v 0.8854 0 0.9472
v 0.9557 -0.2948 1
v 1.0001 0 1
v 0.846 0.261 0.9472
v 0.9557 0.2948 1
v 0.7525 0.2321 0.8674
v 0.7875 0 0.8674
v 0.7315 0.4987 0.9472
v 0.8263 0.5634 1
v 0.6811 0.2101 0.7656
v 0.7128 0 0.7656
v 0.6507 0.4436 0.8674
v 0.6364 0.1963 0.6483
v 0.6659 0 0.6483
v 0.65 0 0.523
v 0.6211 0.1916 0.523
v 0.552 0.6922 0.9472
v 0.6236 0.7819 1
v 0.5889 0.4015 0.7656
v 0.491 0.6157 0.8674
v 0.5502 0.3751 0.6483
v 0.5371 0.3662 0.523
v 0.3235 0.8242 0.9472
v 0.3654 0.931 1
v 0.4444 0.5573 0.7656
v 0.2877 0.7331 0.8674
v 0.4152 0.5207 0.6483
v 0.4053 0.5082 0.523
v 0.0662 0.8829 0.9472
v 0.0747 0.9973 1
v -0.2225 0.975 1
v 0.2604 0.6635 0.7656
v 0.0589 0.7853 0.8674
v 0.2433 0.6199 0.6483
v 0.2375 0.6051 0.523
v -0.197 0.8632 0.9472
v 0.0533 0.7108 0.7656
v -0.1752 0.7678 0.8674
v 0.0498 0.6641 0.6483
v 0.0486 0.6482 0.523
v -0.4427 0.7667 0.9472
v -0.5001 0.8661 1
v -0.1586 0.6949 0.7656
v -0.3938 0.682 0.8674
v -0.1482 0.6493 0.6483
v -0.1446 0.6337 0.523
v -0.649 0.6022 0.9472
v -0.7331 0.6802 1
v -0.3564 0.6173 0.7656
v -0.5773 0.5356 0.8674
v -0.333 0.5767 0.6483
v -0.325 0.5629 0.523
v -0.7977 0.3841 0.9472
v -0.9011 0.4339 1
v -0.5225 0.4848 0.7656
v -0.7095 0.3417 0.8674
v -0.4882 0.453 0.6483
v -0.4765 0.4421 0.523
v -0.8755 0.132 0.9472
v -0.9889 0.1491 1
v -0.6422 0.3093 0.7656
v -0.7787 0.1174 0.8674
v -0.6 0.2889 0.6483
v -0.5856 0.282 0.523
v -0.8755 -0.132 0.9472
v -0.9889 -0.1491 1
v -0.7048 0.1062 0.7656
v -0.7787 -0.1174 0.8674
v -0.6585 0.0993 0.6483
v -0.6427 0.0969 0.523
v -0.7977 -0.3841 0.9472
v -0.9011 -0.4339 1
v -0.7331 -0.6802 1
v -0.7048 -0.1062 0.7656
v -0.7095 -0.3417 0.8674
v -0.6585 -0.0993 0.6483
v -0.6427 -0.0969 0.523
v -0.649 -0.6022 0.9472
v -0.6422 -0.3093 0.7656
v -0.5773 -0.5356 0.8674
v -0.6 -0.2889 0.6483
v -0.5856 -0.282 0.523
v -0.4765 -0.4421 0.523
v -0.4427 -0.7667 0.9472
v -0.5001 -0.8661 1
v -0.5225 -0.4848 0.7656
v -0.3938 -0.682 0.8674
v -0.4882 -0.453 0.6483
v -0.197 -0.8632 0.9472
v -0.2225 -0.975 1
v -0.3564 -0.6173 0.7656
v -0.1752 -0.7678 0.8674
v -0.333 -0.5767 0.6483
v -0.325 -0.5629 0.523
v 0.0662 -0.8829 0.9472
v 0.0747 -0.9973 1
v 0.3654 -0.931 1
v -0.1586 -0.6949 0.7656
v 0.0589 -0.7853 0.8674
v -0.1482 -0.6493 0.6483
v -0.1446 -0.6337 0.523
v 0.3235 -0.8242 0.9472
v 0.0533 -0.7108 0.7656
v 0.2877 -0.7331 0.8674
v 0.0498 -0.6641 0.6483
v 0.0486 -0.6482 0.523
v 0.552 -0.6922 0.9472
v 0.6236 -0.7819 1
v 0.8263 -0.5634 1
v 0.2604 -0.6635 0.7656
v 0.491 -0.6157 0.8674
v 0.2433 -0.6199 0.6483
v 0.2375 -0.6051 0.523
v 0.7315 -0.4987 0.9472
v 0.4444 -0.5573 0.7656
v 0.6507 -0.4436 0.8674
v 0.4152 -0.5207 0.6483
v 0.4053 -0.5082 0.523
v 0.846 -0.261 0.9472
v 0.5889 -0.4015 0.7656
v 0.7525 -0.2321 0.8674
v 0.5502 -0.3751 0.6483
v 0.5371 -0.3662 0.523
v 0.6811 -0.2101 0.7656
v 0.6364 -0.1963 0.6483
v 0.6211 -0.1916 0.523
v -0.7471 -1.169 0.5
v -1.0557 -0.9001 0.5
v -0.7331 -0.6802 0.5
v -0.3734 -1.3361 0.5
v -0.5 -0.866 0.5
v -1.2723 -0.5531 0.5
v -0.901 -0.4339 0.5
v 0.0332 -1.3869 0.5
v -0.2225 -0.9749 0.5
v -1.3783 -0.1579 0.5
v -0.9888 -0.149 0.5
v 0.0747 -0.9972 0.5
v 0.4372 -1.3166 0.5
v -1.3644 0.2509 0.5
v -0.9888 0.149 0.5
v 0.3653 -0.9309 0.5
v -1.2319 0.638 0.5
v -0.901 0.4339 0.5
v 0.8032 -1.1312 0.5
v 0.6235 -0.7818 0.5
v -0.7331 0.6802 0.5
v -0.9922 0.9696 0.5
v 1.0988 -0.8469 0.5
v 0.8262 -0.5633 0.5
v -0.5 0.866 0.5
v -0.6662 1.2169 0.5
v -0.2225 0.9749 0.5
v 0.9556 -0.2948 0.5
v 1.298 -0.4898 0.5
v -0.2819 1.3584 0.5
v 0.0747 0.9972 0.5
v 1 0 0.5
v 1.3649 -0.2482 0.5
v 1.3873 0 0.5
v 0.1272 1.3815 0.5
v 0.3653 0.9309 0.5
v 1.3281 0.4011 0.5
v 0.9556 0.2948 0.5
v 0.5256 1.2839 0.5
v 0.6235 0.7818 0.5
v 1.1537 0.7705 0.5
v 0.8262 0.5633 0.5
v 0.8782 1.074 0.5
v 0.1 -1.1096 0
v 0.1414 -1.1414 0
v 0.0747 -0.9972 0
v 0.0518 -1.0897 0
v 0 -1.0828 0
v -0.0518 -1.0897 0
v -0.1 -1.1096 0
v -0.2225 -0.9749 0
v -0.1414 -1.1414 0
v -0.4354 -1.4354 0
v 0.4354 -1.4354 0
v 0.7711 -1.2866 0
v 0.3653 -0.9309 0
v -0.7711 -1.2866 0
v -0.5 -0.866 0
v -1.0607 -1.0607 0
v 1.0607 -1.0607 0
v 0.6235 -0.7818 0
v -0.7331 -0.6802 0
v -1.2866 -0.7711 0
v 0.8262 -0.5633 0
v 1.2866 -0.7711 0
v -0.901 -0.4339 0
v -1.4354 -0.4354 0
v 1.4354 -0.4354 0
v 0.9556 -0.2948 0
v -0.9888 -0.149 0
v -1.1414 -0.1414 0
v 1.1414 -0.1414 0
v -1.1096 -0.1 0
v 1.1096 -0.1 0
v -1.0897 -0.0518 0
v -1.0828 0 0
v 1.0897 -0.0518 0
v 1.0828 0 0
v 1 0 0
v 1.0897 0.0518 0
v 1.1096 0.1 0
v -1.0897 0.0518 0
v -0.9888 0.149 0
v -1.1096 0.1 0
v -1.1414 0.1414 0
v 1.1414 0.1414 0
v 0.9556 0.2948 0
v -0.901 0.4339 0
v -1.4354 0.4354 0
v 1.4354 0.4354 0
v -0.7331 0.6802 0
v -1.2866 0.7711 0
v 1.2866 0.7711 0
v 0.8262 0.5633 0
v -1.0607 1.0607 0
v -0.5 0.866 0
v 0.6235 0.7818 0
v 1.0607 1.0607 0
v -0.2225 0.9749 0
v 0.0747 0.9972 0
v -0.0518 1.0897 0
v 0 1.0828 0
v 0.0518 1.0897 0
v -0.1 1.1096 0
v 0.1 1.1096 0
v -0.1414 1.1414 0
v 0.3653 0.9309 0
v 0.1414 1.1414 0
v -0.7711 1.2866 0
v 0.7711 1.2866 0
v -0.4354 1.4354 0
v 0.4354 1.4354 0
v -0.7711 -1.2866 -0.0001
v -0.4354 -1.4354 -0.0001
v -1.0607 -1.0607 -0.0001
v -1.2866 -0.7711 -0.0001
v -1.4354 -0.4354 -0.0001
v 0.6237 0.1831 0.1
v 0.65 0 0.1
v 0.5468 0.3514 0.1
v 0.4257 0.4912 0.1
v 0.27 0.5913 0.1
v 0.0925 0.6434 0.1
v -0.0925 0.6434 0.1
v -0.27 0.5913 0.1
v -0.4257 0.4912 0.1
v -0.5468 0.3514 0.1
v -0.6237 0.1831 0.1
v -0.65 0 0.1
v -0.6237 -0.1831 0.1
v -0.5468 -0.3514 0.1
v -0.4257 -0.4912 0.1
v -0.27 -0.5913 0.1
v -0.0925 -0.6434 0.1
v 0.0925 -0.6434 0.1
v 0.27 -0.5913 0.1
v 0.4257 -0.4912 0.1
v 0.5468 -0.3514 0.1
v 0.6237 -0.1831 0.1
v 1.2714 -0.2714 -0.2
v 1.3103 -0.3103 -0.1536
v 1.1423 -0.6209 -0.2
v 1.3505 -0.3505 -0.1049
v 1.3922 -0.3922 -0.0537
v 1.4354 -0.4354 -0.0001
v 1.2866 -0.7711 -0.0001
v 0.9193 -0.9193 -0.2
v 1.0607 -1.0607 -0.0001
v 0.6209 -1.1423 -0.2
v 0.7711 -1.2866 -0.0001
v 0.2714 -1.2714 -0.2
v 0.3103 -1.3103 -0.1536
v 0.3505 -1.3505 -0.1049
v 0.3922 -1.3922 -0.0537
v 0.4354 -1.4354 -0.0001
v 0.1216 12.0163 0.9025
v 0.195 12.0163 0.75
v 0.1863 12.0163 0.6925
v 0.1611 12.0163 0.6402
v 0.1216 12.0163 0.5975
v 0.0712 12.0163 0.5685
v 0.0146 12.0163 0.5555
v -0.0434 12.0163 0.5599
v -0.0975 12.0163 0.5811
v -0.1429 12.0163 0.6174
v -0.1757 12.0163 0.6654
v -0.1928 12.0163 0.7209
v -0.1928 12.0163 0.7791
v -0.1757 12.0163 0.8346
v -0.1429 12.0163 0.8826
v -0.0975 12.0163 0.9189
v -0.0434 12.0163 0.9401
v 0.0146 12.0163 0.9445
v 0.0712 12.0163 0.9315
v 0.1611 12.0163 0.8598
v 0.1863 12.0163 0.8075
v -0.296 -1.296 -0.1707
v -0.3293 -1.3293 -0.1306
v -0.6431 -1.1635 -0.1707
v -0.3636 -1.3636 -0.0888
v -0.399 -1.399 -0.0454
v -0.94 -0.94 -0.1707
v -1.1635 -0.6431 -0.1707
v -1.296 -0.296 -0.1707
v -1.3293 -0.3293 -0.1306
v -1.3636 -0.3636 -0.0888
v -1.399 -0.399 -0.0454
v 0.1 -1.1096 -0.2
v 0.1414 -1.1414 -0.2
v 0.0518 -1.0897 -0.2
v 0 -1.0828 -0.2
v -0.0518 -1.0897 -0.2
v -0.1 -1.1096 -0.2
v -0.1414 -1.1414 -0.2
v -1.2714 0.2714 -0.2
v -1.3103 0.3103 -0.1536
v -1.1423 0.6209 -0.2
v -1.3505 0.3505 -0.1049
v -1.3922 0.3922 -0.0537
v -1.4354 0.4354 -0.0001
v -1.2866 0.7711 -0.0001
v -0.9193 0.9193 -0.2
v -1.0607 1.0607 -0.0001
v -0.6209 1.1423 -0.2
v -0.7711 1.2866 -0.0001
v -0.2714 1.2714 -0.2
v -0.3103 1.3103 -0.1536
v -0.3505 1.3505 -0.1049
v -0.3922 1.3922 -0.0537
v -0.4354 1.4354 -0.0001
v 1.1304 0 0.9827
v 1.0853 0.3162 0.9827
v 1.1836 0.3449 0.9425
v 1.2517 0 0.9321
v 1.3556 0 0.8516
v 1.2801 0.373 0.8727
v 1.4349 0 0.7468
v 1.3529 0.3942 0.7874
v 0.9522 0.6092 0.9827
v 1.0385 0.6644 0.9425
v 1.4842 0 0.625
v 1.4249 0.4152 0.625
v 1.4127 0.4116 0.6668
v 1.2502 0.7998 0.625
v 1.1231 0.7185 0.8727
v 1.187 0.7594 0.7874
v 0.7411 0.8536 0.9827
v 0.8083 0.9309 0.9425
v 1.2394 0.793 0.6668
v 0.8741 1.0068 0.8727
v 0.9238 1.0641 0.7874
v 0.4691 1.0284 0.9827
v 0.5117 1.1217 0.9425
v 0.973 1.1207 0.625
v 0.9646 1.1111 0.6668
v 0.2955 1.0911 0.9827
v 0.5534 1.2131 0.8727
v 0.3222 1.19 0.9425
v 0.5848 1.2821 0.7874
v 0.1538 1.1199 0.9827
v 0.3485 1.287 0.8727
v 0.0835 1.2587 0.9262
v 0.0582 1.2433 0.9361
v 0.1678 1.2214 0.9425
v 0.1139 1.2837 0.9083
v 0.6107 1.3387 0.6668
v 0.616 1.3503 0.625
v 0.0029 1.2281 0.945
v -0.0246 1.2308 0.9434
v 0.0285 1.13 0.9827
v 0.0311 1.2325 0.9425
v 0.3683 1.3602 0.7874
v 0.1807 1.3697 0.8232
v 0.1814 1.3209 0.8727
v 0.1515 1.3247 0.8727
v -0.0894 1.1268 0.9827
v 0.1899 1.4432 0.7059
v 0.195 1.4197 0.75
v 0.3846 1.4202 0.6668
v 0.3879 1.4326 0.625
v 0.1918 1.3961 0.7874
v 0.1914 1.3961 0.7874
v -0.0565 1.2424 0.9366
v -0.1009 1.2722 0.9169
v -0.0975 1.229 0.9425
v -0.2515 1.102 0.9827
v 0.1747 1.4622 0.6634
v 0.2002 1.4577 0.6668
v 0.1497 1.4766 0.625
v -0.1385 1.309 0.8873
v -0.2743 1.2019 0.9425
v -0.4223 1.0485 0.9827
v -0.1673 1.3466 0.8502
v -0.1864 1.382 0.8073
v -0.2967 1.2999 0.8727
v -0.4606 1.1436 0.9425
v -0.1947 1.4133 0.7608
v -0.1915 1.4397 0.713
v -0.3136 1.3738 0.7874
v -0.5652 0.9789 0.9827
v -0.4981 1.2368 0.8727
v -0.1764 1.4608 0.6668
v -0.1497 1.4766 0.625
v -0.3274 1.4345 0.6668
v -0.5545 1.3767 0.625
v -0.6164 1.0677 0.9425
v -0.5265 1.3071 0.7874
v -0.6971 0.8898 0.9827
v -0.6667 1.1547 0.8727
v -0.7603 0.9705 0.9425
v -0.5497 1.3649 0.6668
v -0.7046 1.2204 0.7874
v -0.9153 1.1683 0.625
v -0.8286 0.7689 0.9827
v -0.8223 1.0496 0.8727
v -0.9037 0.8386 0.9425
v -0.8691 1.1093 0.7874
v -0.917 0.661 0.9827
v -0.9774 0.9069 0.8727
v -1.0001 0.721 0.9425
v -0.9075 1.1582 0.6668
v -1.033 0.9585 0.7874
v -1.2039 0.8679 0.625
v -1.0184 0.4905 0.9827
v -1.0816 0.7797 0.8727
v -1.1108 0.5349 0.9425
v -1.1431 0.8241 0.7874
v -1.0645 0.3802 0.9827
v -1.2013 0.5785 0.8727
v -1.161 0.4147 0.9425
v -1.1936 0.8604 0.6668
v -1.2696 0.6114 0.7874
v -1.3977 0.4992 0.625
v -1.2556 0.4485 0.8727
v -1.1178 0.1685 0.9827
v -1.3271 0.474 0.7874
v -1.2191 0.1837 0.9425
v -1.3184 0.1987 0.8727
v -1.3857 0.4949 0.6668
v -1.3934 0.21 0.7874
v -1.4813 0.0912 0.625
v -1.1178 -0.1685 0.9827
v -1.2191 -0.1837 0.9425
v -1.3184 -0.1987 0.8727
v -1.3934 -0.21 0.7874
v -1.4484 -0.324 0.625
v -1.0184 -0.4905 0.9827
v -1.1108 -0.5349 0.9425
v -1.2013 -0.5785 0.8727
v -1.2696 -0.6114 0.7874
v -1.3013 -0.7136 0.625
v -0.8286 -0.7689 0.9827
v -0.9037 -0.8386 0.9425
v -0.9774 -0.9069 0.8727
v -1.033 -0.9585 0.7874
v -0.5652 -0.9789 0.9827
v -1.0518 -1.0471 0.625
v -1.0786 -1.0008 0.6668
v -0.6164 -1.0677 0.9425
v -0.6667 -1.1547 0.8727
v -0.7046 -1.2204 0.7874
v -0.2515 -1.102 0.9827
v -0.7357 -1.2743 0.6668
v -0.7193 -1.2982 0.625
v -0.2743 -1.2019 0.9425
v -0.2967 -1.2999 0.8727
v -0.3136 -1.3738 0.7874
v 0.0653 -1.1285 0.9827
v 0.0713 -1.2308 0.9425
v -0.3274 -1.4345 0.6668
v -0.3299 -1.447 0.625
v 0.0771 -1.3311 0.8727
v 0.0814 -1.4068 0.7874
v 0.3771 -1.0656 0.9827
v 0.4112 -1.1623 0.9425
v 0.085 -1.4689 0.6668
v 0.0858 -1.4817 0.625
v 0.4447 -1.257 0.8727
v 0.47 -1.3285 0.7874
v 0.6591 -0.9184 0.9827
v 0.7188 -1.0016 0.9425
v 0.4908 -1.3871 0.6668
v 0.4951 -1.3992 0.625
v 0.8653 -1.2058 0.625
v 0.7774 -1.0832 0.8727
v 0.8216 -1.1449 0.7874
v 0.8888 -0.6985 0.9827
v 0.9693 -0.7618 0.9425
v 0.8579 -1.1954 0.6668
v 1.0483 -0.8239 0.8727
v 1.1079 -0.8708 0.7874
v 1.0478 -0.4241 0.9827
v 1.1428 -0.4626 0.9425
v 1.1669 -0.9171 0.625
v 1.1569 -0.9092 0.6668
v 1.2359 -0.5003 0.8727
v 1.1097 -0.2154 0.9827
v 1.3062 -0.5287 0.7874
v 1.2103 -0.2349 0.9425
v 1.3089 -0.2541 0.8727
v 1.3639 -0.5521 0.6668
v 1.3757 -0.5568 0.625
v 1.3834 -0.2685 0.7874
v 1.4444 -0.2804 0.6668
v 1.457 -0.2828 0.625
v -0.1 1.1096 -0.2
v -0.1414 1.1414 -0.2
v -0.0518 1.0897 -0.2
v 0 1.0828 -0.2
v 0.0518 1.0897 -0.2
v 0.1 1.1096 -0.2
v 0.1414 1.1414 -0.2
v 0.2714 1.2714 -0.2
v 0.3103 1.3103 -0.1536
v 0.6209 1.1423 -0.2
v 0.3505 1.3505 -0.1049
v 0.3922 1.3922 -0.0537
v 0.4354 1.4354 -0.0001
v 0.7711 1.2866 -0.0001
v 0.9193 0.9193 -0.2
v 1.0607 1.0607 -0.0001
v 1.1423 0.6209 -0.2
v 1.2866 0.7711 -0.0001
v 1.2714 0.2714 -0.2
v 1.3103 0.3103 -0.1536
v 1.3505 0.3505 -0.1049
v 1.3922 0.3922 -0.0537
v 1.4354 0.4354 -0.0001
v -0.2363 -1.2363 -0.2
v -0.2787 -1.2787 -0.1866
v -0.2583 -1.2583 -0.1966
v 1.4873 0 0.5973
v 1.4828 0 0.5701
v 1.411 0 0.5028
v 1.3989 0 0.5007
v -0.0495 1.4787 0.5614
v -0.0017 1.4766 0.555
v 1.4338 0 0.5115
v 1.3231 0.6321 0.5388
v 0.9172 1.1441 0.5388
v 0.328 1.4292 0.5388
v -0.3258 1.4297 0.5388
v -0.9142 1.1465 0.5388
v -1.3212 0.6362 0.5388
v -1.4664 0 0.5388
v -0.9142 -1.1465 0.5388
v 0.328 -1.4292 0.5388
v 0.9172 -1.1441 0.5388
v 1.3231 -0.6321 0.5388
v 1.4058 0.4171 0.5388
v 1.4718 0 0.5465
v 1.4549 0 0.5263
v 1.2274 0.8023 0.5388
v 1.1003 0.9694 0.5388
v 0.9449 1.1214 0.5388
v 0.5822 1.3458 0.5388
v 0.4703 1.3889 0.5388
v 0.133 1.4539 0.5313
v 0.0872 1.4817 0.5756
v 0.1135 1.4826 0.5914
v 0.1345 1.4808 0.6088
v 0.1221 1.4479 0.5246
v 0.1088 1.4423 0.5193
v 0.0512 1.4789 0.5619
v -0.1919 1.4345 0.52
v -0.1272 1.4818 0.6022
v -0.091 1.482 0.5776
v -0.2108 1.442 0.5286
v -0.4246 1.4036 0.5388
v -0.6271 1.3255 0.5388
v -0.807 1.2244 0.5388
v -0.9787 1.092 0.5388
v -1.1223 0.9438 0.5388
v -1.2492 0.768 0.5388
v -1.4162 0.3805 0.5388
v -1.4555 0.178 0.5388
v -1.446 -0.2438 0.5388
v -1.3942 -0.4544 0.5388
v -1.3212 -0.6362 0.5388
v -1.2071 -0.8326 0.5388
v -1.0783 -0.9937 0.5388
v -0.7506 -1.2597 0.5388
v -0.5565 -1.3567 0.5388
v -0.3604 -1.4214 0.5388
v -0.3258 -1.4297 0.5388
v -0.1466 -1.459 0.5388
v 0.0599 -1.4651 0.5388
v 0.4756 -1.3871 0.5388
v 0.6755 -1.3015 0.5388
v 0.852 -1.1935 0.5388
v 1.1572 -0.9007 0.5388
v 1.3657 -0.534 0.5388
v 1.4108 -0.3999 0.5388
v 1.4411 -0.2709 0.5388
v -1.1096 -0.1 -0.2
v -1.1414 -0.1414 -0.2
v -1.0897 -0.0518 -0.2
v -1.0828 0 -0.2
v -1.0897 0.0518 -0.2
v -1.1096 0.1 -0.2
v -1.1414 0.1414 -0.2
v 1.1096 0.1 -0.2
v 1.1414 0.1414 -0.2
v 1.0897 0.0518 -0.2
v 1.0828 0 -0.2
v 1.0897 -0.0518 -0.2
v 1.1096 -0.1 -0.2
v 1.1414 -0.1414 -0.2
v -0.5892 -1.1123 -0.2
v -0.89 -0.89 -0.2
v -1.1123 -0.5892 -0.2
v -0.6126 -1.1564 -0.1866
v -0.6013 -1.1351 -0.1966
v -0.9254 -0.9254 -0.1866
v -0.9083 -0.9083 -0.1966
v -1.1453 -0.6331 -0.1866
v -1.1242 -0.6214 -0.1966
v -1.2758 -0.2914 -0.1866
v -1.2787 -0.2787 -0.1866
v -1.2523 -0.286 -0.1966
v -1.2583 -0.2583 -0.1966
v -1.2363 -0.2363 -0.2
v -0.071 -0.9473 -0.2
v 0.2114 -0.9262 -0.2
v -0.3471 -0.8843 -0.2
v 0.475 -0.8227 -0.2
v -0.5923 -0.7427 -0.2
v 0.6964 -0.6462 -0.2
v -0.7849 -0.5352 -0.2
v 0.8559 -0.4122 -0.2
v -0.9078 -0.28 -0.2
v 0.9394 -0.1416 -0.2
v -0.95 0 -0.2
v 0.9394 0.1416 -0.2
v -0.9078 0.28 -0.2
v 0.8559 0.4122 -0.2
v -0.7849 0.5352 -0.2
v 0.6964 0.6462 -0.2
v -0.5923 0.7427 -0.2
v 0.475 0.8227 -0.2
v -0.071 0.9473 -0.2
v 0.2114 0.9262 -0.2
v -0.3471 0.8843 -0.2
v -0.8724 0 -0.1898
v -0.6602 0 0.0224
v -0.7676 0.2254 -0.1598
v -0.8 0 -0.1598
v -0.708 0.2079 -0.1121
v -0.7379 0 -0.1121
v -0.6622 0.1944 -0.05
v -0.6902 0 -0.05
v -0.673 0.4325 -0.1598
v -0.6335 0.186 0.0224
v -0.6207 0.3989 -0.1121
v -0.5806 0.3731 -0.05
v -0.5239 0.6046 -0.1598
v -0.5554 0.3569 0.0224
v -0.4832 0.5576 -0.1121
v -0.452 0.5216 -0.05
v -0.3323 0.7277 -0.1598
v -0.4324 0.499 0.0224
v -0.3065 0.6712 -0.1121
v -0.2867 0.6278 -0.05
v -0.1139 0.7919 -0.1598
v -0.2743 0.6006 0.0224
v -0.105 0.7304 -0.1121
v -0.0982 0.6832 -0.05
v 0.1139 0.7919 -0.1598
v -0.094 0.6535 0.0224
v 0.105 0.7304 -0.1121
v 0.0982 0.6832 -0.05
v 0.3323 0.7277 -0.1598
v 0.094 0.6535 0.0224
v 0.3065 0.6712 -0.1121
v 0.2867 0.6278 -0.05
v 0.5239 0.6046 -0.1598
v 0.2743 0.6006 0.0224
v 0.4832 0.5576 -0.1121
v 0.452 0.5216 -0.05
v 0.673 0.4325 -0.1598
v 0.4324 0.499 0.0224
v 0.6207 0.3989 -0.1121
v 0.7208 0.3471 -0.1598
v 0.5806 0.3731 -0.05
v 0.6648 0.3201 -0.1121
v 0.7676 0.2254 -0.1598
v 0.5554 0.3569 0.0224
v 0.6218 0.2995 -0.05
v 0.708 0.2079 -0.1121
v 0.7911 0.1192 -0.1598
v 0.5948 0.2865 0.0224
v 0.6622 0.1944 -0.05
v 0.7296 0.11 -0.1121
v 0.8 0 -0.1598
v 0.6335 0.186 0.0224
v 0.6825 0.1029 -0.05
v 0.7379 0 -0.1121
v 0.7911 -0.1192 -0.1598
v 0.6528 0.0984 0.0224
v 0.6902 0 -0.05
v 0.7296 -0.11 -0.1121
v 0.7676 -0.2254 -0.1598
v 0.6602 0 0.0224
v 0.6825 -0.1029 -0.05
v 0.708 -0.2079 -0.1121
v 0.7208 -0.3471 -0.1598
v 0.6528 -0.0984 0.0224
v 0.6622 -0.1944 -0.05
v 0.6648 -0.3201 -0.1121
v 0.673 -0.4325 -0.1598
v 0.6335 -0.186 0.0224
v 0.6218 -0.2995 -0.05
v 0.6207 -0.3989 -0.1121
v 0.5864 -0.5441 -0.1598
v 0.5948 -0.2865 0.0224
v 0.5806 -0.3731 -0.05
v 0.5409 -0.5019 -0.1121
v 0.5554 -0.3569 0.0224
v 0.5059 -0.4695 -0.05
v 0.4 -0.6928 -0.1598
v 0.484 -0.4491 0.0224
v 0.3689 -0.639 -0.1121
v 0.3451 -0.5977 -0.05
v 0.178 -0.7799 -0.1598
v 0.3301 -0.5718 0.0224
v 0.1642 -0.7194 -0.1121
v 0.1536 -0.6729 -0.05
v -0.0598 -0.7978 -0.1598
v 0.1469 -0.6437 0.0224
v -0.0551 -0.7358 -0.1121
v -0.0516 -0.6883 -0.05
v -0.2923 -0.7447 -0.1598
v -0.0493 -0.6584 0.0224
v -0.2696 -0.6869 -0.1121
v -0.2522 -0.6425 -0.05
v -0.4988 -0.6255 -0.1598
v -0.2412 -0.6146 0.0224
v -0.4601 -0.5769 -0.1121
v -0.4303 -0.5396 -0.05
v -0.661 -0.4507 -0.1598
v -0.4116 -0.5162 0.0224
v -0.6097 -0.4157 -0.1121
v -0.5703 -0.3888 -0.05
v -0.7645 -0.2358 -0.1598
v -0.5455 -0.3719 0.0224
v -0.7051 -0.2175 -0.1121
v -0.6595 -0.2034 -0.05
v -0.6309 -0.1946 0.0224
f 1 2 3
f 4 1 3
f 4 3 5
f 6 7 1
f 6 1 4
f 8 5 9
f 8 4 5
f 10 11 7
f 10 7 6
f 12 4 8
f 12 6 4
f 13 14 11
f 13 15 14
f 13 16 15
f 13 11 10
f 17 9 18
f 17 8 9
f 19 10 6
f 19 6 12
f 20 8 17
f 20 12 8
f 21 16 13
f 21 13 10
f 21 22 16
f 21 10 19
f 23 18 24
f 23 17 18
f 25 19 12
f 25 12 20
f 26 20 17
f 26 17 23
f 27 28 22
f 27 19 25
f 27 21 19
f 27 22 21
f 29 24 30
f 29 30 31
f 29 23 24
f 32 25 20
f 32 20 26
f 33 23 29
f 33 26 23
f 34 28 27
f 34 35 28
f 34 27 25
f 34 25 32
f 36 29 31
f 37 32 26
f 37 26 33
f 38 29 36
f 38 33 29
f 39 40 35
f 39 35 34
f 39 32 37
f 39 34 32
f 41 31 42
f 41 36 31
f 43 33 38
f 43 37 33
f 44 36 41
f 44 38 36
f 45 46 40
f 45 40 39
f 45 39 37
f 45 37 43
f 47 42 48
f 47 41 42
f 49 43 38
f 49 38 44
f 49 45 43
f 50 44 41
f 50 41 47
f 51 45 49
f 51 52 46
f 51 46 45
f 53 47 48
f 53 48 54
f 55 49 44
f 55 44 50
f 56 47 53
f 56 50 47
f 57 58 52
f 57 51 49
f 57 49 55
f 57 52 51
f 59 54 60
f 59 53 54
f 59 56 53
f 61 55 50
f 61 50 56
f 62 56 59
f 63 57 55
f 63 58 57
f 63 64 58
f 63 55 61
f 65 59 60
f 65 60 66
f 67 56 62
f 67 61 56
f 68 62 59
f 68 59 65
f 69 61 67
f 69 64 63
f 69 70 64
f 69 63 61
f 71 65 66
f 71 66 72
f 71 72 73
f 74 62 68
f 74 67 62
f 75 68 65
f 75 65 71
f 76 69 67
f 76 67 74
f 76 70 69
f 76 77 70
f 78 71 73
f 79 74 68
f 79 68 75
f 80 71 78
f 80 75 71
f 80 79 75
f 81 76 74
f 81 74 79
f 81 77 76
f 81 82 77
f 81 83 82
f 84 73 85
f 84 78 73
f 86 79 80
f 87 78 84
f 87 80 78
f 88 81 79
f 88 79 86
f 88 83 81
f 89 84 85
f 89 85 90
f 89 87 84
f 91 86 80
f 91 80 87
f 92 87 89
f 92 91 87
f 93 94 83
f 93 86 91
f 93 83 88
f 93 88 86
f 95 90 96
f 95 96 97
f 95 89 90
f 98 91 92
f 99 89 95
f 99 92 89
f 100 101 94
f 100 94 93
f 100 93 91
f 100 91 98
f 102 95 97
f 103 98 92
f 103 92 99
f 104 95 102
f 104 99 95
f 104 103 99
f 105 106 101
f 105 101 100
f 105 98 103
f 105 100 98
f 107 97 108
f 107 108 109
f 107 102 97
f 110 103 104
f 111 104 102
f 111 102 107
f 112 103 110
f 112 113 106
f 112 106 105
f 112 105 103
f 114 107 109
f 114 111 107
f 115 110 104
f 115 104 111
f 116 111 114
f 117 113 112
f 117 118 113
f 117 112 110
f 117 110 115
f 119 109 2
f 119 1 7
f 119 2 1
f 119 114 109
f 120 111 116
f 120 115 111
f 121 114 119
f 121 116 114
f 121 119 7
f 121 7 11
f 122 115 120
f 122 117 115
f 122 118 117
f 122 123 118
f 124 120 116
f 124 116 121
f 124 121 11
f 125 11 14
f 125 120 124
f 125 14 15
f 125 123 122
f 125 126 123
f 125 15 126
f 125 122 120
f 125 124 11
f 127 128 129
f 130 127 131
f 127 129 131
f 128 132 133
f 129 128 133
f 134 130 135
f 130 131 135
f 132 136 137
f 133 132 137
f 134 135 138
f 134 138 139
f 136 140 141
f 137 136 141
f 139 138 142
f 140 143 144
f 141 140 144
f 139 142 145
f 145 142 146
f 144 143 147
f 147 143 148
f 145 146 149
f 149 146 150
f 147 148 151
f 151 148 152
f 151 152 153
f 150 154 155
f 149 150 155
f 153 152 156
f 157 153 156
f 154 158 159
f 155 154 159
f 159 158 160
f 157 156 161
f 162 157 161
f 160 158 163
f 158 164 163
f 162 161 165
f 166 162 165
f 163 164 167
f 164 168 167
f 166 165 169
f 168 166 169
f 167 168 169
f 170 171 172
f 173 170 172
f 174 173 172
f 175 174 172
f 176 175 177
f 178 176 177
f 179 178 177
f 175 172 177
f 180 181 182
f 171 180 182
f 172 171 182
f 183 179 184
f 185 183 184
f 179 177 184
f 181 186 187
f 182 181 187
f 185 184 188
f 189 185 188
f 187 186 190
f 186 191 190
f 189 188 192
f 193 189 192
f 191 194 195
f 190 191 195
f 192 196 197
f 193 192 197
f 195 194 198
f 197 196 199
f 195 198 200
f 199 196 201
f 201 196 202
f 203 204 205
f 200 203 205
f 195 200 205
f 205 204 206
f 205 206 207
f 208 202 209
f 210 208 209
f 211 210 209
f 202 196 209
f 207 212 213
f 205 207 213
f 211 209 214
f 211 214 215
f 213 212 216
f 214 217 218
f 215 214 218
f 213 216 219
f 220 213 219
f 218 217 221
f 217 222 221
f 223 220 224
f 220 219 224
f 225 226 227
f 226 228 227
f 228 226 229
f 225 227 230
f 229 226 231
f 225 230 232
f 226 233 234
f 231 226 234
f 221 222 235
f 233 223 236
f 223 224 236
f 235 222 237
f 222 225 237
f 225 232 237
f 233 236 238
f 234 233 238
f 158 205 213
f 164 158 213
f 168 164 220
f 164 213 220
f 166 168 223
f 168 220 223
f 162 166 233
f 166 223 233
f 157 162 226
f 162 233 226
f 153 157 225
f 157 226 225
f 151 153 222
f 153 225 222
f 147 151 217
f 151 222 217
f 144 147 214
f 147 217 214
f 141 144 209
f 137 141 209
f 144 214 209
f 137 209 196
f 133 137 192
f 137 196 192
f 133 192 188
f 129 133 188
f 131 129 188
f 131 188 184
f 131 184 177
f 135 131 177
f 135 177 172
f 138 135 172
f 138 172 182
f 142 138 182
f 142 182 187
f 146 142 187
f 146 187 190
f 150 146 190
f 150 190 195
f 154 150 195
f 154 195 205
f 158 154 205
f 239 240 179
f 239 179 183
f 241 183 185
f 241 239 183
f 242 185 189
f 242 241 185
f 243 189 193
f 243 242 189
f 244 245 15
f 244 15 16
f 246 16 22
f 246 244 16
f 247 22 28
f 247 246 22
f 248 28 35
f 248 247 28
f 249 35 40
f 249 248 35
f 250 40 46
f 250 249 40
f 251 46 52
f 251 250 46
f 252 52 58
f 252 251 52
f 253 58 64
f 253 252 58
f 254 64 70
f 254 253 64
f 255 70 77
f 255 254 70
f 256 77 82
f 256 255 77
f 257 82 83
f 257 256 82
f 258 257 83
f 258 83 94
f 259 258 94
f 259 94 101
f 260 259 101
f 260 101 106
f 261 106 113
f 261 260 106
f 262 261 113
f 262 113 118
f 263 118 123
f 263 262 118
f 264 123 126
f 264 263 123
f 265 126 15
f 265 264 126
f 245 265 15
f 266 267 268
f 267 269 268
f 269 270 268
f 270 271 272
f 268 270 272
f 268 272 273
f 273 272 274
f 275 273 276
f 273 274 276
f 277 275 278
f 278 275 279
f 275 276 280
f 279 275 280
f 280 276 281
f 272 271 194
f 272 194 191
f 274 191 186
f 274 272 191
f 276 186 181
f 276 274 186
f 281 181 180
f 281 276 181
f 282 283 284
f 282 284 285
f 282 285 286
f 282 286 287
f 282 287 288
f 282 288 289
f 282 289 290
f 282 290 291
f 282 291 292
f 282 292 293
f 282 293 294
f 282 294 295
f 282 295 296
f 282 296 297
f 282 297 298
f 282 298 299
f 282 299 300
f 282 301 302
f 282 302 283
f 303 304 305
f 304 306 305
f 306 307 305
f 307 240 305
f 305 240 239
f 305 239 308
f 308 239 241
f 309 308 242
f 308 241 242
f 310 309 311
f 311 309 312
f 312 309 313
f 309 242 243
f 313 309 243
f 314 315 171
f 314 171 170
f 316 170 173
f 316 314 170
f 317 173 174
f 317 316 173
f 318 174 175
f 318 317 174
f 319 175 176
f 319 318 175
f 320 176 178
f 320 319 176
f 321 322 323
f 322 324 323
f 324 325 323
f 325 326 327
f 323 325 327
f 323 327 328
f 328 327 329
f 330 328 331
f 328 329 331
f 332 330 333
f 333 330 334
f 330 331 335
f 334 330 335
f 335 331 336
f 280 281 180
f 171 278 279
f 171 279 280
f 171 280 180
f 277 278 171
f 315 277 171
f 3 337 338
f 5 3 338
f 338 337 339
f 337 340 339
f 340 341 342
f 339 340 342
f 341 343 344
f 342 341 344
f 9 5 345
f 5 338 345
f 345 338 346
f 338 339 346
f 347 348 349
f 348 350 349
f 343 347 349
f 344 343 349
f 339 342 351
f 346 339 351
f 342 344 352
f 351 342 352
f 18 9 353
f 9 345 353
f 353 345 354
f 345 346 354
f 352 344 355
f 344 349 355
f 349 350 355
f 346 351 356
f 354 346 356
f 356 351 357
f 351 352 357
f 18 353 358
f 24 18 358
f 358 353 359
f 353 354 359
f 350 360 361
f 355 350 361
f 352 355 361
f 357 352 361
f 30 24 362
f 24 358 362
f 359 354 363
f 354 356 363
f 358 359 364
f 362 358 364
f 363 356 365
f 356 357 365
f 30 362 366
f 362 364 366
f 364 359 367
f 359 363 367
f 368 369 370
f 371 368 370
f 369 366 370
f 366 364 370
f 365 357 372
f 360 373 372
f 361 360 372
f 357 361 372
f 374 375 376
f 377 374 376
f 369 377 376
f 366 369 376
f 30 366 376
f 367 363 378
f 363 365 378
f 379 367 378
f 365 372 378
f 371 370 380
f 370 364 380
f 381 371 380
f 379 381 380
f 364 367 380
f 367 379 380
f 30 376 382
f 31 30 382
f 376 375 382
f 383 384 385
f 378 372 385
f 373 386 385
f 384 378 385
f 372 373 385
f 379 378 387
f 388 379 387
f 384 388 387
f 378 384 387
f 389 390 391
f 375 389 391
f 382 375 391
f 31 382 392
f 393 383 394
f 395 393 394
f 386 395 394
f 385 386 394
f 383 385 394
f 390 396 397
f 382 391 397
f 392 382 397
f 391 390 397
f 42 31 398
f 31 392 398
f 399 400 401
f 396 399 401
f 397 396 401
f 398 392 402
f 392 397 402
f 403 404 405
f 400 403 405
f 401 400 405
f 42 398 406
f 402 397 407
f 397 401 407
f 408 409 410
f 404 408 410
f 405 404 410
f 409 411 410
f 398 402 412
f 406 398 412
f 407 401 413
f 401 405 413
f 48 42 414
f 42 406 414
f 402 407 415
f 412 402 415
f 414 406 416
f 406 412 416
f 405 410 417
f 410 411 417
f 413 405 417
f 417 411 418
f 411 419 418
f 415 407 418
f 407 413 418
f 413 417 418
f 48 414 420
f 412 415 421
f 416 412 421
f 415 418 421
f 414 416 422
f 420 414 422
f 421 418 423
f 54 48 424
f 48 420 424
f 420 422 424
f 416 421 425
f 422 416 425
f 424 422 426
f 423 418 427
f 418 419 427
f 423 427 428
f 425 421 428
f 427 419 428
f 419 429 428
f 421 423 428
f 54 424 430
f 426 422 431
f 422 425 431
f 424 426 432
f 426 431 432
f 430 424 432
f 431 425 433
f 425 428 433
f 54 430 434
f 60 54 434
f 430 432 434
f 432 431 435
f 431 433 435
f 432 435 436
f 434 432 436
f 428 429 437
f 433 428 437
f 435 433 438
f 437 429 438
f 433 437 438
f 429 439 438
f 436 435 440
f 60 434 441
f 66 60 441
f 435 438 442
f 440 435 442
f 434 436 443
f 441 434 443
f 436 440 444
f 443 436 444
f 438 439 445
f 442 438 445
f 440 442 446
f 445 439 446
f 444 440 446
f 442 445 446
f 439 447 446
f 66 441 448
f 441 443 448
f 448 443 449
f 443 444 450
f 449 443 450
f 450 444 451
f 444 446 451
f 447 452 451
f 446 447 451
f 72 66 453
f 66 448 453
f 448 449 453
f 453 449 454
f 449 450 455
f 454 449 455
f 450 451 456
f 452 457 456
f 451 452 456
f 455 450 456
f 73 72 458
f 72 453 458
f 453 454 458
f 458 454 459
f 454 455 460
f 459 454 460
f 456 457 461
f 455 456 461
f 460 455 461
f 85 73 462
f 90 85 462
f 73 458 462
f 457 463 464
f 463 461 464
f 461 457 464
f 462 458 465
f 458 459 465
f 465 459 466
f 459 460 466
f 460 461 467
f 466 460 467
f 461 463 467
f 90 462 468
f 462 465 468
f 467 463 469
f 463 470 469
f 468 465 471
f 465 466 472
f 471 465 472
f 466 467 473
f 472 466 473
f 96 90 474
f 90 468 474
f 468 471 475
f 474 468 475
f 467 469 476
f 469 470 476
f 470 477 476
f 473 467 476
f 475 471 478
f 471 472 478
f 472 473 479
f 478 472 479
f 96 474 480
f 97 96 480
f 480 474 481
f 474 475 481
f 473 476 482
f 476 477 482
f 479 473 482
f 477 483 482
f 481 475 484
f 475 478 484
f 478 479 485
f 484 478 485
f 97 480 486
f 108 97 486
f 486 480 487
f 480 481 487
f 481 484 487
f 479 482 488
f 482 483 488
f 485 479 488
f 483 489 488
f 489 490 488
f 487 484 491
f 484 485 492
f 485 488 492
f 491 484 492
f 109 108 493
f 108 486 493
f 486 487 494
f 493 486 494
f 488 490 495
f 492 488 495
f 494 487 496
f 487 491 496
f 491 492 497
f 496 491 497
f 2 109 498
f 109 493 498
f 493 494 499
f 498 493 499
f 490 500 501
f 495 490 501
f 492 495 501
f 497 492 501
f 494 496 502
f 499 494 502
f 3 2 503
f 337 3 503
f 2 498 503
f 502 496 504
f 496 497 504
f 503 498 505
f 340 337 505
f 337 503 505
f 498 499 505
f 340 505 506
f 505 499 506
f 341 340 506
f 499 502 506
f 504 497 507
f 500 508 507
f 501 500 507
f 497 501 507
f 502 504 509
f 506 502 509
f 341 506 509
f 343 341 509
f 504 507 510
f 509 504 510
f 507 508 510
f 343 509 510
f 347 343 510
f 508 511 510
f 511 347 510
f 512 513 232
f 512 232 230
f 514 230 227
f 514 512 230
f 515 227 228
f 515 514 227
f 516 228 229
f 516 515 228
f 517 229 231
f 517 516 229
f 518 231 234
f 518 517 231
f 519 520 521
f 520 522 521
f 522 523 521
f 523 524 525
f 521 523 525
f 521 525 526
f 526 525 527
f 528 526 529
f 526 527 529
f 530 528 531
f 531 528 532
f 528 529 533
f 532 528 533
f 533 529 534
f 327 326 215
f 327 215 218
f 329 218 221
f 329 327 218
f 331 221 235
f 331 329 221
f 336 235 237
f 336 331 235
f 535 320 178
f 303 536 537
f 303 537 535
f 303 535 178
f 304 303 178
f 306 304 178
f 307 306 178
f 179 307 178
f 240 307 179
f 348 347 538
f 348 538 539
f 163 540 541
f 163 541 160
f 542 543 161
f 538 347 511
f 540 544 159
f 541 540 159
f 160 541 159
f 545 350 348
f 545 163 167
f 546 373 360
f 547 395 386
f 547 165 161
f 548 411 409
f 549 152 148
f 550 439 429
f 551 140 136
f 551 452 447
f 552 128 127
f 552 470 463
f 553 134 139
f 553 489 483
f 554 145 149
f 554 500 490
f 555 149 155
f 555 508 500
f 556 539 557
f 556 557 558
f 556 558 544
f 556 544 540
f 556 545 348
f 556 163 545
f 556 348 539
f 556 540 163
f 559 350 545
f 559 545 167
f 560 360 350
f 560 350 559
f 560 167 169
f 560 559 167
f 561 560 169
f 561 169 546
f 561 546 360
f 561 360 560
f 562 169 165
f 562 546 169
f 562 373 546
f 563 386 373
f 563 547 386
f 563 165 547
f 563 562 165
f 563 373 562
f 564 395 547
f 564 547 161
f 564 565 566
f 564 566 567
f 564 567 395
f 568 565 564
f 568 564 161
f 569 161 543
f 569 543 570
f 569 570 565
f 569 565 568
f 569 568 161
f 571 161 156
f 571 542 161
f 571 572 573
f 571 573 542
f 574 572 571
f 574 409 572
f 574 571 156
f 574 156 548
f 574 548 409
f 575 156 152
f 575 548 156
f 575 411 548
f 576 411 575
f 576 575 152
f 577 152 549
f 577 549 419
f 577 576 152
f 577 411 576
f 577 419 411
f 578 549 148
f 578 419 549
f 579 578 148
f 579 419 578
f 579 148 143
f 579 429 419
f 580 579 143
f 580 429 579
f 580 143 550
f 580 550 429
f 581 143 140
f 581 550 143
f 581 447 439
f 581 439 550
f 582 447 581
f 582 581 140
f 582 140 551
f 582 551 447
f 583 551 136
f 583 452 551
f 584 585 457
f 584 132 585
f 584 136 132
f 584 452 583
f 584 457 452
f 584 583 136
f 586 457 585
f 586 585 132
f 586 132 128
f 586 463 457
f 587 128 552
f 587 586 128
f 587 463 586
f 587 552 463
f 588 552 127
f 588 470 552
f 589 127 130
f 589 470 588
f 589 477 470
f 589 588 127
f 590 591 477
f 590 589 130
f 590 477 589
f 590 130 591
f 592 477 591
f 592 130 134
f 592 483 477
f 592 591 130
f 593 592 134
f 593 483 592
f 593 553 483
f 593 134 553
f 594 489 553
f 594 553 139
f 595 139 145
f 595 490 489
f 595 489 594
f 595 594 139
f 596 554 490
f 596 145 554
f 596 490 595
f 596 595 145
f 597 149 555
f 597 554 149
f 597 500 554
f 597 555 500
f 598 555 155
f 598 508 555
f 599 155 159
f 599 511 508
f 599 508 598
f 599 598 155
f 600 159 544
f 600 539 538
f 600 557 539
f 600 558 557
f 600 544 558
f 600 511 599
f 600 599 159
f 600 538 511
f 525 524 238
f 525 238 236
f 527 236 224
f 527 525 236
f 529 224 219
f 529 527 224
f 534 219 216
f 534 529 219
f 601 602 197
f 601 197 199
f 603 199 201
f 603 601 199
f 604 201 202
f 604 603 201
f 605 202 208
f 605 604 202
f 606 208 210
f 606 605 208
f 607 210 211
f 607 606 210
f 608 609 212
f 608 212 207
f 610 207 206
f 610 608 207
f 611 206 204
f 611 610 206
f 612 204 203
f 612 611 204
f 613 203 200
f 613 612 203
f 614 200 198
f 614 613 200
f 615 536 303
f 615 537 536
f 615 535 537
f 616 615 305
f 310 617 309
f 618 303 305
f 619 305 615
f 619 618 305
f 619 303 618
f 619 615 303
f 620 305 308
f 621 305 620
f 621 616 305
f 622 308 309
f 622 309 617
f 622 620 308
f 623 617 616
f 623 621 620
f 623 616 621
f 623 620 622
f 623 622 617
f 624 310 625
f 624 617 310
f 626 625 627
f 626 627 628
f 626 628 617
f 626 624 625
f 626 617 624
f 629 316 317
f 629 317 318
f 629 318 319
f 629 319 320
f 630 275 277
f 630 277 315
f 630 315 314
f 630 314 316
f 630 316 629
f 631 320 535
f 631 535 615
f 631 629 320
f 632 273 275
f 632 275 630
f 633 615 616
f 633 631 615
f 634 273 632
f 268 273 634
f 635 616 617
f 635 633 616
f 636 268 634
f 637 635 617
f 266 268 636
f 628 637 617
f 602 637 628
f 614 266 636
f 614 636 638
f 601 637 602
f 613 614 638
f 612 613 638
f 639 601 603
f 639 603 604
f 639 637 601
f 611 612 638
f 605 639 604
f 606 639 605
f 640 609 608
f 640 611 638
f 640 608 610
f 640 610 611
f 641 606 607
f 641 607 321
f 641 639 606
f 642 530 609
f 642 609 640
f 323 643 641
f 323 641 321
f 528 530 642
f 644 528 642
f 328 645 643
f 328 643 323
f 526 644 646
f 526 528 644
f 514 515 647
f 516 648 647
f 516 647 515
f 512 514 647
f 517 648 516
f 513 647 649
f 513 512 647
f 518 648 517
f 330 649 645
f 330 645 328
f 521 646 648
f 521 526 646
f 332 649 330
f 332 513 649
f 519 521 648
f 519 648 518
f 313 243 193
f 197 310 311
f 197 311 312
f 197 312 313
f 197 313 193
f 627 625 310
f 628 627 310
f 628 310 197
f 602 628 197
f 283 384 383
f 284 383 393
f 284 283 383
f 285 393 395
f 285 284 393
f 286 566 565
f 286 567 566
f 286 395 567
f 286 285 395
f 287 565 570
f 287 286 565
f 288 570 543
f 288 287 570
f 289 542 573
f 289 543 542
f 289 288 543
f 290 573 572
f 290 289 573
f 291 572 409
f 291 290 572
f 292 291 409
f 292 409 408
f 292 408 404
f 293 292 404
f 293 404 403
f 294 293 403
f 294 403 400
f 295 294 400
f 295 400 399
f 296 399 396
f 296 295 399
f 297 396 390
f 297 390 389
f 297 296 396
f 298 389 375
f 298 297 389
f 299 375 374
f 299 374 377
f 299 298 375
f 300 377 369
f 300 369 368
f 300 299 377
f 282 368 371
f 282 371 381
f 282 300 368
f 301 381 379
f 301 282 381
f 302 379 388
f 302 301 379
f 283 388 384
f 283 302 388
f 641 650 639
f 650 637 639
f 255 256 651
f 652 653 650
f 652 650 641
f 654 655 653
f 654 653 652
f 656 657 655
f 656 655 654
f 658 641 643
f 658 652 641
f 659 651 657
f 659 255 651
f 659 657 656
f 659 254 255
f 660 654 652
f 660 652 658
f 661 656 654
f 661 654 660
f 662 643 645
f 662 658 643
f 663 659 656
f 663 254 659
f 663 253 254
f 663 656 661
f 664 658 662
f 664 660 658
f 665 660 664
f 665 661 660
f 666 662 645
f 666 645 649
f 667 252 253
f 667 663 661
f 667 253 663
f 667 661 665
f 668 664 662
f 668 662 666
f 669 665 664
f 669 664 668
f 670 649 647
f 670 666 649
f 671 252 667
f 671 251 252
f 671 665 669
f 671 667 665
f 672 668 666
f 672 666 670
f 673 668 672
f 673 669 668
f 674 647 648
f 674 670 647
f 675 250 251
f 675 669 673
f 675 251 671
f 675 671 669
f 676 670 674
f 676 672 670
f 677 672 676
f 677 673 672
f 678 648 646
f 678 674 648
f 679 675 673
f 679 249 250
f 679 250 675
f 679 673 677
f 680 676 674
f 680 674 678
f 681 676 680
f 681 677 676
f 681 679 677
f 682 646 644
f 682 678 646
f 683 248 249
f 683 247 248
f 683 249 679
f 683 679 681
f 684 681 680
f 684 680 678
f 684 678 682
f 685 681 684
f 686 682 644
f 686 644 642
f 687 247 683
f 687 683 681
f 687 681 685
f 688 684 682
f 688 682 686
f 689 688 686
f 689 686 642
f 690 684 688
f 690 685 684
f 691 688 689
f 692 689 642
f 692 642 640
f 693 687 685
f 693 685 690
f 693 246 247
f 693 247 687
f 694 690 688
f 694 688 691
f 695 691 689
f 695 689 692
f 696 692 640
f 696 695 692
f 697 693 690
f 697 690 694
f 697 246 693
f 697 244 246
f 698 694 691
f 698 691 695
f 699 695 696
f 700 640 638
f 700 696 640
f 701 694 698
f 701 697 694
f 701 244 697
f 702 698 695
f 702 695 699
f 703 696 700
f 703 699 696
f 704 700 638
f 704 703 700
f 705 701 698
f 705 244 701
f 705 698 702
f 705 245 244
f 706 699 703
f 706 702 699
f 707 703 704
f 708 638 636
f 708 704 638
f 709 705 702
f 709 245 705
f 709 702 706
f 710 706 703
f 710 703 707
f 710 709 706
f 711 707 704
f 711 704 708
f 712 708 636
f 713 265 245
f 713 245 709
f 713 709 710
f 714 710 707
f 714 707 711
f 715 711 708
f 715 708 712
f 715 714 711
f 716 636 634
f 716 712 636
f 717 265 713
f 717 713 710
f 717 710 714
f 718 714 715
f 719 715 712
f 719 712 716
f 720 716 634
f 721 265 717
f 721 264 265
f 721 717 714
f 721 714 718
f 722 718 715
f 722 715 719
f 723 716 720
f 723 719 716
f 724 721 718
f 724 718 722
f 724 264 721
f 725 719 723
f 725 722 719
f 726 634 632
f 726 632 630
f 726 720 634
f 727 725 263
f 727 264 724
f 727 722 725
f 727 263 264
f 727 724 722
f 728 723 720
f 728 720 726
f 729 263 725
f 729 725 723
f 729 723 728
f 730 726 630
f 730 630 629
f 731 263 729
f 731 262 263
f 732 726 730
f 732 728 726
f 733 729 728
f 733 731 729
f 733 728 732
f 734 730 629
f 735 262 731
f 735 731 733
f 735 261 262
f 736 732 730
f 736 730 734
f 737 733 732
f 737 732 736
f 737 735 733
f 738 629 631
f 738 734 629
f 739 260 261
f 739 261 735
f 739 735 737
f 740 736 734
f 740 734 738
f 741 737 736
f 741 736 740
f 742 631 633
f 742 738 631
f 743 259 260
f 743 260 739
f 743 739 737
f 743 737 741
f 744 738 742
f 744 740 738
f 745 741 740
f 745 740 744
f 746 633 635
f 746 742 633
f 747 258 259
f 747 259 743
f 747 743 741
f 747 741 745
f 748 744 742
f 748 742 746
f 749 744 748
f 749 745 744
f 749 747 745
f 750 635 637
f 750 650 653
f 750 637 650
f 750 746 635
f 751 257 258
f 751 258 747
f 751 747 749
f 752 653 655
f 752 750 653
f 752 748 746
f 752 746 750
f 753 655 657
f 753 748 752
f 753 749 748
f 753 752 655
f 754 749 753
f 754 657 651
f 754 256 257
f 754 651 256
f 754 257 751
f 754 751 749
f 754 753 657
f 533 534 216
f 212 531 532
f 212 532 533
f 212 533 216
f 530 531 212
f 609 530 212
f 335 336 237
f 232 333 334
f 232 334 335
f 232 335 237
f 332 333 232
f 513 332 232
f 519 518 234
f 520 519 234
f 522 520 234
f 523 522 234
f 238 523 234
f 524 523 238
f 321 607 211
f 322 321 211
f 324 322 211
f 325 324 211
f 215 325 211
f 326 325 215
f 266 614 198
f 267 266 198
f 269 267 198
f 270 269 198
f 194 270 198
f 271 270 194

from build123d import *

# Parameters (mm, degrees)
SKETCH1_R           = 1
SKETCH1_R_2         = 0.65
BOSS_EXTRUDE1_DEPTH = 0.5
SKETCH3_R           = 1.5
SKETCH3_R_2         = 0.65
BOSS_EXTRUDE4_DEPTH = 0.5
BOSS_EXTRUDE5_START = 0.2
SKETCH4_R           = 0.65
BOSS_EXTRUDE5_DEPTH = 0.2
FILLET4_R           = 0.5
FILLET5_R           = 0.5
FILLET6_R           = 0.1
CHAMFER2_SIZE       = 0.2
FILLET8_R           = 0.2
FILLET9_R           = 0.1
FILLET10_R          = 0.3
SKETCH6_R           = 0.195


# Some blends are built 0.0001 mm under size
with BuildPart() as part:
    # Sketch1 → Boss-Extrude1 (new body)
    with BuildSketch(Plane.XY):
        Circle(SKETCH1_R)
        Circle(SKETCH1_R_2, mode=Mode.SUBTRACT)
    extrude(amount=BOSS_EXTRUDE1_DEPTH)

    # Sketch3 → Boss-Extrude4 (add)
    with BuildSketch(Plane.XY.offset(0.5)):
        Circle(SKETCH3_R)
        Circle(SKETCH3_R_2, mode=Mode.SUBTRACT)
    extrude(amount=BOSS_EXTRUDE4_DEPTH)

    # Sketch4 → Boss-Extrude5 (add)
    with BuildSketch(Plane(origin=(0, 0, 0), x_dir=(-1, 0, 0), z_dir=(0, 0, -1)).offset(BOSS_EXTRUDE5_START)):
        with BuildLine():
            Line((0, 1), (-0.435414347, 1.435414347))
            ThreePointArc((-0.435414347, 1.435414347), (-1.060660172, 1.060660172), (-1.435414347, 0.435414347))
            Line((-1.435414347, 0.435414347), (-1, 0))
            Line((-1, 0), (-1.435414347, -0.435414347))
            ThreePointArc((-1.435414347, -0.435414347), (-1.060660172, -1.060660172), (-0.435414347, -1.435414347))
            Line((-0.435414347, -1.435414347), (0, -1))
            Line((0, -1), (0.435414347, -1.435414347))
            ThreePointArc((0.435414347, -1.435414347), (1.060660172, -1.060660172), (1.435414347, -0.435414347))
            Line((1.435414347, -0.435414347), (1, 0))
            Line((1, 0), (1.435414347, 0.435414347))
            ThreePointArc((1.435414347, 0.435414347), (1.060660172, 1.060660172), (0.435414347, 1.435414347))
            Line((0.435414347, 1.435414347), (0, 1))
        make_face()
        Circle(SKETCH4_R, mode=Mode.SUBTRACT)
    extrude(amount=-BOSS_EXTRUDE5_DEPTH)

    # Fillet4
    fillet4_edges = [part.edges().sort_by_distance(p)[0] for p in [
        (-1.5, 0, 1),
    ]]
    fillet(fillet4_edges, radius=FILLET4_R - 0.0001)  # a hair under: the kernel refuses the full size

    # Fillet5
    # the kernel refuses this fillet: 0.5 mm, written as the material it takes off along each edge
    with BuildSketch(Plane(origin=(0, 0, 1), x_dir=(1, 0, 0), z_dir=(0, -1, 0))) as fillet5_piece_1:
        with BuildLine():
            CenterArc((1.15, -0.477001038), FILLET5_R, 107.44559106, 72.55440894)
            Line((0.65, -0.477001038), (0.64, -0.477001038))
            Line((0.64, -0.477001038), (0.64, 0))
            Line((0.64, 0), (0.65, 0.01))
            ThreePointArc((0.65, 0.01), (0.82505, 0.01), (0.997102, 0.009540021))
            Line((0.997102, 0.009540021), (1.0001, 0))
        make_face()
    revolve(axis=Axis((0, 0, 1), (0, 0, 1)), mode=Mode.SUBTRACT)

    # Fillet6
    fillet6_edges = [part.edges().sort_by_distance(p)[0] for p in [
        (-1.5, 0, 0.5),
    ]]
    fillet(fillet6_edges, radius=FILLET6_R)

    # Chamfer2
    chamfer2_edges = [part.edges().sort_by_distance(p)[0] for p in [
        (-1.060660172, -1.060660172, -0.2),
        (-1.060660172, 1.060660172, -0.2),
        (1.060660172, 1.060660172, -0.2),
        (1.060660172, -1.060660172, -0.2),
    ]]
    chamfer(chamfer2_edges, length=CHAMFER2_SIZE - 0.0001)  # a hair under: the kernel refuses the full size

    # Fillet8
    # the kernel refuses this fillet: 0.2 mm, written as the material it adds along each edge
    with BuildSketch(Plane(origin=(0, 1, -0.2), x_dir=(-0.7071067811865487, 0.7071067811865465, 0), z_dir=(0, 0, 1)), Plane(origin=(-1, 0, -0.2), x_dir=(-0.7071067811865464, -0.7071067811865487, 0), z_dir=(0, 0, 1))) as fillet8_piece_1:
        with BuildLine():
            CenterArc((FILLET8_R, -FILLET8_R), FILLET8_R, 90, 90)
            Line((0, -FILLET8_R), (0, 0))
            Line((0, 0), (FILLET8_R, 0))
        make_face()
    extrude(amount=0.2)
    with BuildSketch(Plane(origin=(1, 0, -0.2), x_dir=(0.707106781186541, -0.707106781186554, 0), z_dir=(0, 0, 1)), Plane(origin=(0, -1, -0.2), x_dir=(-0.707106781186554, -0.707106781186541, 0), z_dir=(0, 0, 1))) as fillet8_piece_2:
        with BuildLine():
            CenterArc((FILLET8_R, FILLET8_R), FILLET8_R, 180, 90)
            Line((0, FILLET8_R), (0, 0))
            Line((0, 0), (FILLET8_R, 0))
        make_face()
    extrude(amount=0.2)

    # Fillet9
    fillet9_edges = [part.edges().sort_by_distance(p)[0] for p in [
        (-0.919309526, -0.919309526, -0.2),
    ]]
    fillet(fillet9_edges, radius=FILLET9_R)

    # Fillet10
    # the kernel refuses this fillet: 0.3 mm, written as the material it takes off along each edge
    with BuildSketch(Plane(origin=(0, 0, -0.2), x_dir=(-1, 0, 0), z_dir=(0, -1, 0))) as fillet10_piece_1:
        with BuildLine():
            CenterArc((0.65 + FILLET10_R, -FILLET10_R), FILLET10_R, 90, 90)
            Line((0.65, -FILLET10_R), (0.65, 0))
            Line((0.65, 0), (0.65 + FILLET10_R, 0))
        make_face()
    revolve(axis=Axis((0, 0, -0.2), (0, 0, -1)), mode=Mode.SUBTRACT)

    # Sweep2: sweep along a path in Sketch5
    with BuildLine(Plane.XY.offset(0.75)) as sweep2_path:
        Line((0, 1), (0, 12.016341366))
    # Sketch6 → Sweep2 (sweep)
    with BuildSketch(Plane(origin=(0, 1, 0), x_dir=(1, 0, 0), z_dir=(0, 1, 0))):
        with Locations((0, -0.75)):
            Circle(SKETCH6_R)
    sweep(path=sweep2_path.line)


solid = part.part
